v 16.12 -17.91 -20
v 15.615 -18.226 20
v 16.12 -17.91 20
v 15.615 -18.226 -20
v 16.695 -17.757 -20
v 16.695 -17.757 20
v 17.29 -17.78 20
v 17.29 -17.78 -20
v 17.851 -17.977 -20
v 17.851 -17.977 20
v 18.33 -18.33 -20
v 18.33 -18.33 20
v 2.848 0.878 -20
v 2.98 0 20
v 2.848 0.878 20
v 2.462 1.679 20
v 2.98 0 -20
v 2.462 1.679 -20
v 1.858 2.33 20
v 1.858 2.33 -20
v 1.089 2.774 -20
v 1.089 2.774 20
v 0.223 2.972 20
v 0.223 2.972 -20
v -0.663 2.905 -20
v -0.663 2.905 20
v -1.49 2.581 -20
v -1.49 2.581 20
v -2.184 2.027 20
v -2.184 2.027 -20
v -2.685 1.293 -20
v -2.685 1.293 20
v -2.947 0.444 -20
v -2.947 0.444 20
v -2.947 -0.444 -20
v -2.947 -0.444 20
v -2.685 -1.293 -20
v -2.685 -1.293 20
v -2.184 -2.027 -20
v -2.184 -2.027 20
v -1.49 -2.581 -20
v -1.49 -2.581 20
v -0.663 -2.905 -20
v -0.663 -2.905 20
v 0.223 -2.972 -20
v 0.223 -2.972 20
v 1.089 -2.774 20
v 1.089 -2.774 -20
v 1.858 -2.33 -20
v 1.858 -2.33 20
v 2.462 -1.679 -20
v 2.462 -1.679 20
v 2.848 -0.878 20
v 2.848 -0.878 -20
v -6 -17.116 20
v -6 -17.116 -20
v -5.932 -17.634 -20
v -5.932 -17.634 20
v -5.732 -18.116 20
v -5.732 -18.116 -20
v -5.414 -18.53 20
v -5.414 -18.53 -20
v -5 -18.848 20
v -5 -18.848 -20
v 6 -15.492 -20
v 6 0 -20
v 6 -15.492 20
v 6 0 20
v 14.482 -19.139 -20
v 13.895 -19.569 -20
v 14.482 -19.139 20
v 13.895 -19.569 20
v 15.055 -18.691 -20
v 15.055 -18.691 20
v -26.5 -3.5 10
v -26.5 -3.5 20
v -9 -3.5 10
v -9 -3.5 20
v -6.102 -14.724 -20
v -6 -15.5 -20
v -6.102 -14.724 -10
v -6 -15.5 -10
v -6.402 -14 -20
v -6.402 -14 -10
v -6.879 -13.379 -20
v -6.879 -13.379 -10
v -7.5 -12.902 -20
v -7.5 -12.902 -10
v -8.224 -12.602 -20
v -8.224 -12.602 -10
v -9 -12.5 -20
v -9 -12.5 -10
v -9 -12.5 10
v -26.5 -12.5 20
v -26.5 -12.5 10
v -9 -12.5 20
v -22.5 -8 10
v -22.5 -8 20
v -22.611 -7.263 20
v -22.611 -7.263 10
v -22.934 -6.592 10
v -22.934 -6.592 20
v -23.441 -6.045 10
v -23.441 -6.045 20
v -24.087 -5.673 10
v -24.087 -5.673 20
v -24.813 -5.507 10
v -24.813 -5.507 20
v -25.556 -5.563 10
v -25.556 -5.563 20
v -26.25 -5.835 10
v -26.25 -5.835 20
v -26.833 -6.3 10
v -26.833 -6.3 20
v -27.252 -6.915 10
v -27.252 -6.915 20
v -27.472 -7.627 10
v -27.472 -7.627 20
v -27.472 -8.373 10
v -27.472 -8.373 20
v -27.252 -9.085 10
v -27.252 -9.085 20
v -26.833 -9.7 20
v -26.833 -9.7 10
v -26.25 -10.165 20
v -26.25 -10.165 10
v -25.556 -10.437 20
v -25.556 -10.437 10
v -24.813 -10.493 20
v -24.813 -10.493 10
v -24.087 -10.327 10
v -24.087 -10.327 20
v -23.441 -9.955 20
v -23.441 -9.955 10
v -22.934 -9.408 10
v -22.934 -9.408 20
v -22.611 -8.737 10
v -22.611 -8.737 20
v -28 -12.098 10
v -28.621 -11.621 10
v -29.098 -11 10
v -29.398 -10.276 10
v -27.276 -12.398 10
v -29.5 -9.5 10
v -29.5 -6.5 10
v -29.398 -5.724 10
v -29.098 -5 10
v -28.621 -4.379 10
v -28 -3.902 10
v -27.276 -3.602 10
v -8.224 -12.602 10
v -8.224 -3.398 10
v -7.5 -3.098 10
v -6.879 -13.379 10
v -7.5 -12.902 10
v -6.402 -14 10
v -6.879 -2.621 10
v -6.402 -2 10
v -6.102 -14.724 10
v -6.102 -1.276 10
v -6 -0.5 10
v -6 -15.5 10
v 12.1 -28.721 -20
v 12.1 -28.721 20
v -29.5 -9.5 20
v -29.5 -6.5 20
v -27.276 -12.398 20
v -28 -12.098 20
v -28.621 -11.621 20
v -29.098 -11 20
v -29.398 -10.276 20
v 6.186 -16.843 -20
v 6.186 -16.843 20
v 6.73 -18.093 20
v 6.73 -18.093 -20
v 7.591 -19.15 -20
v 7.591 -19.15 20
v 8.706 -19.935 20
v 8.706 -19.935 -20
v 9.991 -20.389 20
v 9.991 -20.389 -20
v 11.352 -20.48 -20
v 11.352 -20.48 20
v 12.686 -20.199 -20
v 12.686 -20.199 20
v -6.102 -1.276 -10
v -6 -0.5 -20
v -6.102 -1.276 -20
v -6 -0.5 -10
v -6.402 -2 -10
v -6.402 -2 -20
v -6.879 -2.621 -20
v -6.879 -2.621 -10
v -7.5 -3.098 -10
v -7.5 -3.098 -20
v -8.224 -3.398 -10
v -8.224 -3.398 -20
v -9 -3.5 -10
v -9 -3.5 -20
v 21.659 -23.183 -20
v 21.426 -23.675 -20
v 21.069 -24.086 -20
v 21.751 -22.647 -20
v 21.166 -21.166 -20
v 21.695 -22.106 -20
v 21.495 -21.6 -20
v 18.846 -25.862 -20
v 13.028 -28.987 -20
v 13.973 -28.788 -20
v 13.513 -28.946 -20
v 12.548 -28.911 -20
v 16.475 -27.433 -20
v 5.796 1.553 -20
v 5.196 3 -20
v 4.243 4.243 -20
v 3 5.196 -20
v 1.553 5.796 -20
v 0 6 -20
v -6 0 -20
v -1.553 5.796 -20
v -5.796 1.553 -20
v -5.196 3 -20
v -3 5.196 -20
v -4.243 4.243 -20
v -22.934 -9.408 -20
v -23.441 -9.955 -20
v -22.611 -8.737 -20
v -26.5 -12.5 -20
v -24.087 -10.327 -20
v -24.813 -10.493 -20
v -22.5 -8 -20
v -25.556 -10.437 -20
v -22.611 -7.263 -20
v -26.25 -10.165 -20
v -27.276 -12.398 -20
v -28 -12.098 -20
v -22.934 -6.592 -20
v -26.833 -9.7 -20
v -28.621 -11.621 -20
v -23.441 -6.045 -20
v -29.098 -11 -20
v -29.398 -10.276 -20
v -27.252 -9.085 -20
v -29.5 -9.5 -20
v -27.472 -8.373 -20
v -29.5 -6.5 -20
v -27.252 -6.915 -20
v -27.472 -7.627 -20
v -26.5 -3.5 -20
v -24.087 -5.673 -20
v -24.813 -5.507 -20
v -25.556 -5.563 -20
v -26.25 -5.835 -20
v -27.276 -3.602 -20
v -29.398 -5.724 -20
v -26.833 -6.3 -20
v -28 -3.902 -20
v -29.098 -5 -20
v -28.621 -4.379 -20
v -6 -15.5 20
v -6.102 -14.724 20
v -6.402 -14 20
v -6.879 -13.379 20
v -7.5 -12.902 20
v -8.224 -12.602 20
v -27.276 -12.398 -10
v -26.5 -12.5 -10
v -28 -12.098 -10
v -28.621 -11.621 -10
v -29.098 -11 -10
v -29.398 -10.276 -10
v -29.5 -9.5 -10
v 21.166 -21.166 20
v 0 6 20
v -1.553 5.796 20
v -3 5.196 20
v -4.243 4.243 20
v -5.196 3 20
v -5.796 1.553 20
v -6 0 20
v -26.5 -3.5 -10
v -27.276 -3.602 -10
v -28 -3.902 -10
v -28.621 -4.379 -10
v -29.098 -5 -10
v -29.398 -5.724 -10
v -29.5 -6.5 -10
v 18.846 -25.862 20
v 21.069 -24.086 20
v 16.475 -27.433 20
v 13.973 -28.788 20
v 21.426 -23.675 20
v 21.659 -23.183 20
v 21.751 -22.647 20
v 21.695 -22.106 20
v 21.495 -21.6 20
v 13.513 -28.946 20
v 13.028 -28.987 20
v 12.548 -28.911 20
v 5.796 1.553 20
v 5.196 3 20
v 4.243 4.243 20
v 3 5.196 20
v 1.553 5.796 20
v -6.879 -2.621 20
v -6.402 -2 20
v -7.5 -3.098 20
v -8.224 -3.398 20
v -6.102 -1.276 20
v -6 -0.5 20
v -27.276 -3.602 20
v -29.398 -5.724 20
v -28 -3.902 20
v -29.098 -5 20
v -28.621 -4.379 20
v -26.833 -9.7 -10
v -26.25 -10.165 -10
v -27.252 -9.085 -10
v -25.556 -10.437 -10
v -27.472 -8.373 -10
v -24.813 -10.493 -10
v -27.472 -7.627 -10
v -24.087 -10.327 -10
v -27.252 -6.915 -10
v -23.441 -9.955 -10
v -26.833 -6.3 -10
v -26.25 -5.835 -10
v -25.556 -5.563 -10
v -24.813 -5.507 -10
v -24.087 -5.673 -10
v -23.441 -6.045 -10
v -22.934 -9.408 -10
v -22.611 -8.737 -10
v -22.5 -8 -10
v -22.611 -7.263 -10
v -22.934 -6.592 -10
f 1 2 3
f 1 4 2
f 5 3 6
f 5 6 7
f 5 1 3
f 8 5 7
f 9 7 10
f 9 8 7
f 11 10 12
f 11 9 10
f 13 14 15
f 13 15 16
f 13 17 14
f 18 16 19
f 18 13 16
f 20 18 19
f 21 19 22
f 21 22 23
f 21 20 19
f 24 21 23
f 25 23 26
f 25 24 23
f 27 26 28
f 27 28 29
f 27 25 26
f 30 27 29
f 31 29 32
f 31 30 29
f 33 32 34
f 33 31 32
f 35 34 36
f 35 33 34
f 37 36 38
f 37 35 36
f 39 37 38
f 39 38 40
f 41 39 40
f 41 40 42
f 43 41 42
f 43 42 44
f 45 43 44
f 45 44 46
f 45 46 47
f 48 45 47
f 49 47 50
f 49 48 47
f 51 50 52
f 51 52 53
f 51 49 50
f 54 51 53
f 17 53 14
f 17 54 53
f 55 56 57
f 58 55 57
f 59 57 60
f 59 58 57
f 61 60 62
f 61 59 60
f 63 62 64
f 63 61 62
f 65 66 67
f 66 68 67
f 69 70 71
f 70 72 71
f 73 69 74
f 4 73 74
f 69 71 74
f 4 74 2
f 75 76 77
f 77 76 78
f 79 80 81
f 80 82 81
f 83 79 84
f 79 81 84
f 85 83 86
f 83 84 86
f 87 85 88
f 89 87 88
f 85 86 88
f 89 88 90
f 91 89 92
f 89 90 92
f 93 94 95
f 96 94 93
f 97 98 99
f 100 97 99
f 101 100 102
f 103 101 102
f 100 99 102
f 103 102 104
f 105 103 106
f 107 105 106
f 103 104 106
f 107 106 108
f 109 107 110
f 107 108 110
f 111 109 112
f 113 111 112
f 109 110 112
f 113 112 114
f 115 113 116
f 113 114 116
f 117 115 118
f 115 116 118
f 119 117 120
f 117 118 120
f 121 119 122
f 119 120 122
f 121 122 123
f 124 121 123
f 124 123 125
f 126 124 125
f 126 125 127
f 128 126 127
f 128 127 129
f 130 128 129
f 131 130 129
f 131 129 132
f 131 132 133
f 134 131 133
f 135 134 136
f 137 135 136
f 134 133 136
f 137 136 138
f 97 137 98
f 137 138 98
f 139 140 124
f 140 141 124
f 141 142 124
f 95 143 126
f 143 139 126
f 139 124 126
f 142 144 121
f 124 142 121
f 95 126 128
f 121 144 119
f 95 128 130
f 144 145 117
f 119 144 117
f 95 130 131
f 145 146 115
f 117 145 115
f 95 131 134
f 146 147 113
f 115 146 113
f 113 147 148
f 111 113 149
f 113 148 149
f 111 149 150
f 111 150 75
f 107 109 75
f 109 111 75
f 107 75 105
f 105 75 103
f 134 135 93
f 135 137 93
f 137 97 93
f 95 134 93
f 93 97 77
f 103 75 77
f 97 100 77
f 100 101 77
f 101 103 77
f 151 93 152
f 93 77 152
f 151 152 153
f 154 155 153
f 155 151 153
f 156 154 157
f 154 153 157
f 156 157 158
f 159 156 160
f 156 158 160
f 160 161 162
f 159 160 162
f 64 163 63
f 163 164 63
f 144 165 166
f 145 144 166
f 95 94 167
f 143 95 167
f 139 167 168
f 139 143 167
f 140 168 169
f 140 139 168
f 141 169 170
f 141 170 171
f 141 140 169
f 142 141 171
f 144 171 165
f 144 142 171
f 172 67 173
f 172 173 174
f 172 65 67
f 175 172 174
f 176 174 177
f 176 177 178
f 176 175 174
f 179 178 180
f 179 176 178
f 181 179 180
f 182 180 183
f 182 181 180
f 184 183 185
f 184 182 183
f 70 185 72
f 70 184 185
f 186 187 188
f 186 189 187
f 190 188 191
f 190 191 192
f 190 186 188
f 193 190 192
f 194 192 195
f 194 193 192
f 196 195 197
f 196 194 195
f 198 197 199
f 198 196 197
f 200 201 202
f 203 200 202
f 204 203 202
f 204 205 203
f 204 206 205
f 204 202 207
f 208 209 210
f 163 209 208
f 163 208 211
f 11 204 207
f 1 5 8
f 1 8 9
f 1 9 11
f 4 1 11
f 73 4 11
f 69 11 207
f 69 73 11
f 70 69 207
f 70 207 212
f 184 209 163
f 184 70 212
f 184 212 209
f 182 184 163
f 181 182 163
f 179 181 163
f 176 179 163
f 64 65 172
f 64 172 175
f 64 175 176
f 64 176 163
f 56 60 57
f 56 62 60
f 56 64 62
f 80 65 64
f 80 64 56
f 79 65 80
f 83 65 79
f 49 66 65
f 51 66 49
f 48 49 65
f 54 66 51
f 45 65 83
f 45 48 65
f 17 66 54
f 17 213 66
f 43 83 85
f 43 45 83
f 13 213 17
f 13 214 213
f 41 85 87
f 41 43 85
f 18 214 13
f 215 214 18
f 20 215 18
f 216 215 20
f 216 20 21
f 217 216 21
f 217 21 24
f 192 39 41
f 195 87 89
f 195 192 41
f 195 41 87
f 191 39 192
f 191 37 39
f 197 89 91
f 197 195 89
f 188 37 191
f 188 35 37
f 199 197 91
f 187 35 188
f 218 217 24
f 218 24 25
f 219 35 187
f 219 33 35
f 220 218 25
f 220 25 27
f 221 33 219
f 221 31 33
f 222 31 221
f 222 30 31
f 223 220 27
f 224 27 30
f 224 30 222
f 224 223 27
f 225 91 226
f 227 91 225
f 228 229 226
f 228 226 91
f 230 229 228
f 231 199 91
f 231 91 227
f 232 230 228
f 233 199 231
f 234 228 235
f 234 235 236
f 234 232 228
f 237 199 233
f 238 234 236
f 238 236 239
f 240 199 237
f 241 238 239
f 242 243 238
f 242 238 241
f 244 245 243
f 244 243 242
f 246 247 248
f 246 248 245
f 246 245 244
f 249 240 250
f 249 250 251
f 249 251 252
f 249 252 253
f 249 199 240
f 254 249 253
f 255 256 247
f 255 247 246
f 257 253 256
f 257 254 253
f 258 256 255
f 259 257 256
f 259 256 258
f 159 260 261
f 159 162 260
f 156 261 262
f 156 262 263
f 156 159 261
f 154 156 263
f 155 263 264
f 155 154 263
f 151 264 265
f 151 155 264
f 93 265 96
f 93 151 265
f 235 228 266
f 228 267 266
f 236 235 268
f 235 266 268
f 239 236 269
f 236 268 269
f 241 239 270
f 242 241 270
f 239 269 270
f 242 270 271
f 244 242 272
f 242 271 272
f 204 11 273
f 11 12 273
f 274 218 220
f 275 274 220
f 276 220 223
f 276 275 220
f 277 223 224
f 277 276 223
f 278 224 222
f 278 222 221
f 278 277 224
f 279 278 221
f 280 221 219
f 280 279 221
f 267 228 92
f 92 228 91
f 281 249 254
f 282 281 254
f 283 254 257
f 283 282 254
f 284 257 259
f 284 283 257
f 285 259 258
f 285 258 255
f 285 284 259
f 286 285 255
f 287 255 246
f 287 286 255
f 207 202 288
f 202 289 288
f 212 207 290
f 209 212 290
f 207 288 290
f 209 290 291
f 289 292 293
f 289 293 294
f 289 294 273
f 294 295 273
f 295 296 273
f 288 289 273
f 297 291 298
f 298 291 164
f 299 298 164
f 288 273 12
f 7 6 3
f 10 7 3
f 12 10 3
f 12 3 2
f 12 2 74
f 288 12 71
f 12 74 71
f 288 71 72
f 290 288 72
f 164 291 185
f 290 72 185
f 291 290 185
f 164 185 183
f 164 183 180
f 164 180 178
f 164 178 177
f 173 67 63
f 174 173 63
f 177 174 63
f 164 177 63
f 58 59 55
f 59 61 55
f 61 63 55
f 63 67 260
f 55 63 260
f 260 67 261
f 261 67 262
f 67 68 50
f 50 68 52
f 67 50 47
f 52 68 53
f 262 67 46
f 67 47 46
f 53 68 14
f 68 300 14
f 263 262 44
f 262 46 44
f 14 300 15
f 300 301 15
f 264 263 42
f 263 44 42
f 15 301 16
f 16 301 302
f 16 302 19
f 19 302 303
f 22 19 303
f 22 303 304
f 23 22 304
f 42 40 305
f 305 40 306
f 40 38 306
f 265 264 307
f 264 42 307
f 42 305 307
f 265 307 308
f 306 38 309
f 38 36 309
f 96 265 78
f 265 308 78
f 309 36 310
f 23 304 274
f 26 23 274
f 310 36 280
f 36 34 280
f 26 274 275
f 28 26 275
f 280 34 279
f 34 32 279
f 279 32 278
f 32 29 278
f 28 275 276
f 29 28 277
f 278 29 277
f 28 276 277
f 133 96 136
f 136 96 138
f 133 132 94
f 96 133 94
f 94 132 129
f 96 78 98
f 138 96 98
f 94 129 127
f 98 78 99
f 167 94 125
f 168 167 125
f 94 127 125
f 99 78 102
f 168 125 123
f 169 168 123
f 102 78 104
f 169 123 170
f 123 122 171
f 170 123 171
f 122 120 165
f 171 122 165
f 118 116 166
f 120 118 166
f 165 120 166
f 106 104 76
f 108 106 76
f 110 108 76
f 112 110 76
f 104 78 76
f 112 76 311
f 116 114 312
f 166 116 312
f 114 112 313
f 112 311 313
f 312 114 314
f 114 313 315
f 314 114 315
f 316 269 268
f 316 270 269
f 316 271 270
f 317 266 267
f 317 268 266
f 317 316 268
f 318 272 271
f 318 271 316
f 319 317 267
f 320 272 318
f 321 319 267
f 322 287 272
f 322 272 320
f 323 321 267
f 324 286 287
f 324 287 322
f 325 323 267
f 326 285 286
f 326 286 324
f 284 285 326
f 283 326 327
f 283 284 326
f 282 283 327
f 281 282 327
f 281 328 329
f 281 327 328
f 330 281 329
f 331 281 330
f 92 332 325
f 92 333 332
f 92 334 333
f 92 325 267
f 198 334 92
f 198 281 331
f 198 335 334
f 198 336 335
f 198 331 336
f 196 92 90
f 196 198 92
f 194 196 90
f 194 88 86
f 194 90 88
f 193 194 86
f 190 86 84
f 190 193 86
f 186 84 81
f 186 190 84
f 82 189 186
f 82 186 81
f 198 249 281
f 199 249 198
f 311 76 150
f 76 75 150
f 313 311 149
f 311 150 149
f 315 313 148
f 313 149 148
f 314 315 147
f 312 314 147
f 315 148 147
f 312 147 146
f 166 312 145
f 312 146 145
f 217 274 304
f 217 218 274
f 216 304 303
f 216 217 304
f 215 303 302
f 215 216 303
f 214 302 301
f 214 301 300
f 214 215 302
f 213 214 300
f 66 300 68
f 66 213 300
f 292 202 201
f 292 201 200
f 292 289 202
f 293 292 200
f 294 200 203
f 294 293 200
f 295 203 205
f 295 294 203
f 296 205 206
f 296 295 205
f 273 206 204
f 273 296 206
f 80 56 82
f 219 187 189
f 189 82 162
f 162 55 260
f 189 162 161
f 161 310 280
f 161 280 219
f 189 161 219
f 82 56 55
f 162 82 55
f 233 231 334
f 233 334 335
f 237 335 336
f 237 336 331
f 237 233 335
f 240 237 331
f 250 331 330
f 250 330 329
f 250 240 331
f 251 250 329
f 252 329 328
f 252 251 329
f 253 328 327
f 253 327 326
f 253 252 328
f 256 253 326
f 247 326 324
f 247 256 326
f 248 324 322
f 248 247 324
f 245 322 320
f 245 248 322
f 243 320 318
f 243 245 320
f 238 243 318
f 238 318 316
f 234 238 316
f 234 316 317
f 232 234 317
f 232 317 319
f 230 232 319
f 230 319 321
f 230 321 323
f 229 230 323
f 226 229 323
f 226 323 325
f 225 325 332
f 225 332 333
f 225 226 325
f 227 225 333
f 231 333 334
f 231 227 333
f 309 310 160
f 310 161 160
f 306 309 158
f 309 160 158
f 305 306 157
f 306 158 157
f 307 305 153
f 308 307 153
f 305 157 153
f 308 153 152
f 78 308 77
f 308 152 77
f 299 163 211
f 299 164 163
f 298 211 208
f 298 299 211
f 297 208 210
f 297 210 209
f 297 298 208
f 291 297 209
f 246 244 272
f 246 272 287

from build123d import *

# Parameters (mm, degrees)
SKETCH2_R            = 2.98
BOSS_EXTRUDE1_DEPTH  = 20
FILLET1_R            = 6
FILLET2_R            = 2
FILLET4_R            = 5
SKETCH3_W            = 23.5
SKETCH3_H            = 9
SKETCH3_R            = 2.5
BOSS_EXTRUDE2_DEPTH  = 10
FILLET3_R            = 3
FILLET3_OF_MIRROR1_R = 3


with BuildPart() as part:
    # Sketch2 → Boss-Extrude1 (new, symmetric)
    with BuildSketch(Plane.XY):
        with BuildLine():
            Line((-6, 6), (6, 6))
            Line((6, 6), (6, -23.237900077))
            ThreePointArc((6, -23.237900077), (11.905106784, -20.839108245), (16.970562748, -16.970562748))
            Line((16.970562748, -16.970562748), (22.627416998, -22.627416998))
            ThreePointArc((22.627416998, -22.627416998), (18.117975616, -26.376864096), (13, -29.240383034))
            Line((13, -29.240383034), (-6, -18.27072792))
            Line((-6, -18.27072792), (-6, 6))
        make_face()
        Circle(SKETCH2_R, mode=Mode.SUBTRACT)
    extrude(amount=BOSS_EXTRUDE1_DEPTH, both=True)

    # Fillet1
    fillet1_edges = [part.edges().sort_by_distance(p)[0] for p in [
        (6, 6, 0),
        (-6, 6, 0),
    ]]
    fillet(fillet1_edges, radius=FILLET1_R - 0.0001)  # a hair under: the kernel refuses the full size

    # Fillet2
    fillet2_edges = [part.edges().sort_by_distance(p)[0] for p in [
        (16.970562748, -16.970562748, 0),
        (22.627416998, -22.627416998, 0),
        (13, -29.240383034, 0),
        (-6, -18.27072792, 0),
    ]]
    fillet(fillet2_edges, radius=FILLET2_R)

    # Fillet4
    fillet4_edges = [part.edges().sort_by_distance(p)[0] for p in [
        (6, -23.237900077, 0),
    ]]
    fillet(fillet4_edges, radius=FILLET4_R)

    # Sketch3 → Boss-Extrude2 (add)
    with BuildSketch(Plane.XY.offset(20)):
        with Locations((-17.75, -8)):
            Rectangle(SKETCH3_W, SKETCH3_H)
        with Locations((-25, -8)):
            Circle(SKETCH3_R, mode=Mode.SUBTRACT)
    boss_extrude2 = extrude(amount=-BOSS_EXTRUDE2_DEPTH)

    # Fillet3
    fillet3_edges = [part.edges().sort_by_distance(p)[0] for p in [
        (-6, -3.5, 15),
        (-6, -12.5, 15),
        (-29.5, -12.5, 15),
        (-29.5, -3.5, 15),
    ]]
    fillet(fillet3_edges, radius=FILLET3_R)

    # Mirror1: Boss-Extrude2 across plane
    add(boss_extrude2.mirror(Plane.XY))

    # Fillet3 of Mirror1
    fillet3_of_mirror1_edges = [part.edges().sort_by_distance(p)[0] for p in [
        (-6, -3.5, -15),
        (-6, -12.5, -15),
        (-29.5, -12.5, -15),
        (-29.5, -3.5, -15),
    ]]
    fillet(fillet3_of_mirror1_edges, radius=FILLET3_OF_MIRROR1_R)


solid = part.part
